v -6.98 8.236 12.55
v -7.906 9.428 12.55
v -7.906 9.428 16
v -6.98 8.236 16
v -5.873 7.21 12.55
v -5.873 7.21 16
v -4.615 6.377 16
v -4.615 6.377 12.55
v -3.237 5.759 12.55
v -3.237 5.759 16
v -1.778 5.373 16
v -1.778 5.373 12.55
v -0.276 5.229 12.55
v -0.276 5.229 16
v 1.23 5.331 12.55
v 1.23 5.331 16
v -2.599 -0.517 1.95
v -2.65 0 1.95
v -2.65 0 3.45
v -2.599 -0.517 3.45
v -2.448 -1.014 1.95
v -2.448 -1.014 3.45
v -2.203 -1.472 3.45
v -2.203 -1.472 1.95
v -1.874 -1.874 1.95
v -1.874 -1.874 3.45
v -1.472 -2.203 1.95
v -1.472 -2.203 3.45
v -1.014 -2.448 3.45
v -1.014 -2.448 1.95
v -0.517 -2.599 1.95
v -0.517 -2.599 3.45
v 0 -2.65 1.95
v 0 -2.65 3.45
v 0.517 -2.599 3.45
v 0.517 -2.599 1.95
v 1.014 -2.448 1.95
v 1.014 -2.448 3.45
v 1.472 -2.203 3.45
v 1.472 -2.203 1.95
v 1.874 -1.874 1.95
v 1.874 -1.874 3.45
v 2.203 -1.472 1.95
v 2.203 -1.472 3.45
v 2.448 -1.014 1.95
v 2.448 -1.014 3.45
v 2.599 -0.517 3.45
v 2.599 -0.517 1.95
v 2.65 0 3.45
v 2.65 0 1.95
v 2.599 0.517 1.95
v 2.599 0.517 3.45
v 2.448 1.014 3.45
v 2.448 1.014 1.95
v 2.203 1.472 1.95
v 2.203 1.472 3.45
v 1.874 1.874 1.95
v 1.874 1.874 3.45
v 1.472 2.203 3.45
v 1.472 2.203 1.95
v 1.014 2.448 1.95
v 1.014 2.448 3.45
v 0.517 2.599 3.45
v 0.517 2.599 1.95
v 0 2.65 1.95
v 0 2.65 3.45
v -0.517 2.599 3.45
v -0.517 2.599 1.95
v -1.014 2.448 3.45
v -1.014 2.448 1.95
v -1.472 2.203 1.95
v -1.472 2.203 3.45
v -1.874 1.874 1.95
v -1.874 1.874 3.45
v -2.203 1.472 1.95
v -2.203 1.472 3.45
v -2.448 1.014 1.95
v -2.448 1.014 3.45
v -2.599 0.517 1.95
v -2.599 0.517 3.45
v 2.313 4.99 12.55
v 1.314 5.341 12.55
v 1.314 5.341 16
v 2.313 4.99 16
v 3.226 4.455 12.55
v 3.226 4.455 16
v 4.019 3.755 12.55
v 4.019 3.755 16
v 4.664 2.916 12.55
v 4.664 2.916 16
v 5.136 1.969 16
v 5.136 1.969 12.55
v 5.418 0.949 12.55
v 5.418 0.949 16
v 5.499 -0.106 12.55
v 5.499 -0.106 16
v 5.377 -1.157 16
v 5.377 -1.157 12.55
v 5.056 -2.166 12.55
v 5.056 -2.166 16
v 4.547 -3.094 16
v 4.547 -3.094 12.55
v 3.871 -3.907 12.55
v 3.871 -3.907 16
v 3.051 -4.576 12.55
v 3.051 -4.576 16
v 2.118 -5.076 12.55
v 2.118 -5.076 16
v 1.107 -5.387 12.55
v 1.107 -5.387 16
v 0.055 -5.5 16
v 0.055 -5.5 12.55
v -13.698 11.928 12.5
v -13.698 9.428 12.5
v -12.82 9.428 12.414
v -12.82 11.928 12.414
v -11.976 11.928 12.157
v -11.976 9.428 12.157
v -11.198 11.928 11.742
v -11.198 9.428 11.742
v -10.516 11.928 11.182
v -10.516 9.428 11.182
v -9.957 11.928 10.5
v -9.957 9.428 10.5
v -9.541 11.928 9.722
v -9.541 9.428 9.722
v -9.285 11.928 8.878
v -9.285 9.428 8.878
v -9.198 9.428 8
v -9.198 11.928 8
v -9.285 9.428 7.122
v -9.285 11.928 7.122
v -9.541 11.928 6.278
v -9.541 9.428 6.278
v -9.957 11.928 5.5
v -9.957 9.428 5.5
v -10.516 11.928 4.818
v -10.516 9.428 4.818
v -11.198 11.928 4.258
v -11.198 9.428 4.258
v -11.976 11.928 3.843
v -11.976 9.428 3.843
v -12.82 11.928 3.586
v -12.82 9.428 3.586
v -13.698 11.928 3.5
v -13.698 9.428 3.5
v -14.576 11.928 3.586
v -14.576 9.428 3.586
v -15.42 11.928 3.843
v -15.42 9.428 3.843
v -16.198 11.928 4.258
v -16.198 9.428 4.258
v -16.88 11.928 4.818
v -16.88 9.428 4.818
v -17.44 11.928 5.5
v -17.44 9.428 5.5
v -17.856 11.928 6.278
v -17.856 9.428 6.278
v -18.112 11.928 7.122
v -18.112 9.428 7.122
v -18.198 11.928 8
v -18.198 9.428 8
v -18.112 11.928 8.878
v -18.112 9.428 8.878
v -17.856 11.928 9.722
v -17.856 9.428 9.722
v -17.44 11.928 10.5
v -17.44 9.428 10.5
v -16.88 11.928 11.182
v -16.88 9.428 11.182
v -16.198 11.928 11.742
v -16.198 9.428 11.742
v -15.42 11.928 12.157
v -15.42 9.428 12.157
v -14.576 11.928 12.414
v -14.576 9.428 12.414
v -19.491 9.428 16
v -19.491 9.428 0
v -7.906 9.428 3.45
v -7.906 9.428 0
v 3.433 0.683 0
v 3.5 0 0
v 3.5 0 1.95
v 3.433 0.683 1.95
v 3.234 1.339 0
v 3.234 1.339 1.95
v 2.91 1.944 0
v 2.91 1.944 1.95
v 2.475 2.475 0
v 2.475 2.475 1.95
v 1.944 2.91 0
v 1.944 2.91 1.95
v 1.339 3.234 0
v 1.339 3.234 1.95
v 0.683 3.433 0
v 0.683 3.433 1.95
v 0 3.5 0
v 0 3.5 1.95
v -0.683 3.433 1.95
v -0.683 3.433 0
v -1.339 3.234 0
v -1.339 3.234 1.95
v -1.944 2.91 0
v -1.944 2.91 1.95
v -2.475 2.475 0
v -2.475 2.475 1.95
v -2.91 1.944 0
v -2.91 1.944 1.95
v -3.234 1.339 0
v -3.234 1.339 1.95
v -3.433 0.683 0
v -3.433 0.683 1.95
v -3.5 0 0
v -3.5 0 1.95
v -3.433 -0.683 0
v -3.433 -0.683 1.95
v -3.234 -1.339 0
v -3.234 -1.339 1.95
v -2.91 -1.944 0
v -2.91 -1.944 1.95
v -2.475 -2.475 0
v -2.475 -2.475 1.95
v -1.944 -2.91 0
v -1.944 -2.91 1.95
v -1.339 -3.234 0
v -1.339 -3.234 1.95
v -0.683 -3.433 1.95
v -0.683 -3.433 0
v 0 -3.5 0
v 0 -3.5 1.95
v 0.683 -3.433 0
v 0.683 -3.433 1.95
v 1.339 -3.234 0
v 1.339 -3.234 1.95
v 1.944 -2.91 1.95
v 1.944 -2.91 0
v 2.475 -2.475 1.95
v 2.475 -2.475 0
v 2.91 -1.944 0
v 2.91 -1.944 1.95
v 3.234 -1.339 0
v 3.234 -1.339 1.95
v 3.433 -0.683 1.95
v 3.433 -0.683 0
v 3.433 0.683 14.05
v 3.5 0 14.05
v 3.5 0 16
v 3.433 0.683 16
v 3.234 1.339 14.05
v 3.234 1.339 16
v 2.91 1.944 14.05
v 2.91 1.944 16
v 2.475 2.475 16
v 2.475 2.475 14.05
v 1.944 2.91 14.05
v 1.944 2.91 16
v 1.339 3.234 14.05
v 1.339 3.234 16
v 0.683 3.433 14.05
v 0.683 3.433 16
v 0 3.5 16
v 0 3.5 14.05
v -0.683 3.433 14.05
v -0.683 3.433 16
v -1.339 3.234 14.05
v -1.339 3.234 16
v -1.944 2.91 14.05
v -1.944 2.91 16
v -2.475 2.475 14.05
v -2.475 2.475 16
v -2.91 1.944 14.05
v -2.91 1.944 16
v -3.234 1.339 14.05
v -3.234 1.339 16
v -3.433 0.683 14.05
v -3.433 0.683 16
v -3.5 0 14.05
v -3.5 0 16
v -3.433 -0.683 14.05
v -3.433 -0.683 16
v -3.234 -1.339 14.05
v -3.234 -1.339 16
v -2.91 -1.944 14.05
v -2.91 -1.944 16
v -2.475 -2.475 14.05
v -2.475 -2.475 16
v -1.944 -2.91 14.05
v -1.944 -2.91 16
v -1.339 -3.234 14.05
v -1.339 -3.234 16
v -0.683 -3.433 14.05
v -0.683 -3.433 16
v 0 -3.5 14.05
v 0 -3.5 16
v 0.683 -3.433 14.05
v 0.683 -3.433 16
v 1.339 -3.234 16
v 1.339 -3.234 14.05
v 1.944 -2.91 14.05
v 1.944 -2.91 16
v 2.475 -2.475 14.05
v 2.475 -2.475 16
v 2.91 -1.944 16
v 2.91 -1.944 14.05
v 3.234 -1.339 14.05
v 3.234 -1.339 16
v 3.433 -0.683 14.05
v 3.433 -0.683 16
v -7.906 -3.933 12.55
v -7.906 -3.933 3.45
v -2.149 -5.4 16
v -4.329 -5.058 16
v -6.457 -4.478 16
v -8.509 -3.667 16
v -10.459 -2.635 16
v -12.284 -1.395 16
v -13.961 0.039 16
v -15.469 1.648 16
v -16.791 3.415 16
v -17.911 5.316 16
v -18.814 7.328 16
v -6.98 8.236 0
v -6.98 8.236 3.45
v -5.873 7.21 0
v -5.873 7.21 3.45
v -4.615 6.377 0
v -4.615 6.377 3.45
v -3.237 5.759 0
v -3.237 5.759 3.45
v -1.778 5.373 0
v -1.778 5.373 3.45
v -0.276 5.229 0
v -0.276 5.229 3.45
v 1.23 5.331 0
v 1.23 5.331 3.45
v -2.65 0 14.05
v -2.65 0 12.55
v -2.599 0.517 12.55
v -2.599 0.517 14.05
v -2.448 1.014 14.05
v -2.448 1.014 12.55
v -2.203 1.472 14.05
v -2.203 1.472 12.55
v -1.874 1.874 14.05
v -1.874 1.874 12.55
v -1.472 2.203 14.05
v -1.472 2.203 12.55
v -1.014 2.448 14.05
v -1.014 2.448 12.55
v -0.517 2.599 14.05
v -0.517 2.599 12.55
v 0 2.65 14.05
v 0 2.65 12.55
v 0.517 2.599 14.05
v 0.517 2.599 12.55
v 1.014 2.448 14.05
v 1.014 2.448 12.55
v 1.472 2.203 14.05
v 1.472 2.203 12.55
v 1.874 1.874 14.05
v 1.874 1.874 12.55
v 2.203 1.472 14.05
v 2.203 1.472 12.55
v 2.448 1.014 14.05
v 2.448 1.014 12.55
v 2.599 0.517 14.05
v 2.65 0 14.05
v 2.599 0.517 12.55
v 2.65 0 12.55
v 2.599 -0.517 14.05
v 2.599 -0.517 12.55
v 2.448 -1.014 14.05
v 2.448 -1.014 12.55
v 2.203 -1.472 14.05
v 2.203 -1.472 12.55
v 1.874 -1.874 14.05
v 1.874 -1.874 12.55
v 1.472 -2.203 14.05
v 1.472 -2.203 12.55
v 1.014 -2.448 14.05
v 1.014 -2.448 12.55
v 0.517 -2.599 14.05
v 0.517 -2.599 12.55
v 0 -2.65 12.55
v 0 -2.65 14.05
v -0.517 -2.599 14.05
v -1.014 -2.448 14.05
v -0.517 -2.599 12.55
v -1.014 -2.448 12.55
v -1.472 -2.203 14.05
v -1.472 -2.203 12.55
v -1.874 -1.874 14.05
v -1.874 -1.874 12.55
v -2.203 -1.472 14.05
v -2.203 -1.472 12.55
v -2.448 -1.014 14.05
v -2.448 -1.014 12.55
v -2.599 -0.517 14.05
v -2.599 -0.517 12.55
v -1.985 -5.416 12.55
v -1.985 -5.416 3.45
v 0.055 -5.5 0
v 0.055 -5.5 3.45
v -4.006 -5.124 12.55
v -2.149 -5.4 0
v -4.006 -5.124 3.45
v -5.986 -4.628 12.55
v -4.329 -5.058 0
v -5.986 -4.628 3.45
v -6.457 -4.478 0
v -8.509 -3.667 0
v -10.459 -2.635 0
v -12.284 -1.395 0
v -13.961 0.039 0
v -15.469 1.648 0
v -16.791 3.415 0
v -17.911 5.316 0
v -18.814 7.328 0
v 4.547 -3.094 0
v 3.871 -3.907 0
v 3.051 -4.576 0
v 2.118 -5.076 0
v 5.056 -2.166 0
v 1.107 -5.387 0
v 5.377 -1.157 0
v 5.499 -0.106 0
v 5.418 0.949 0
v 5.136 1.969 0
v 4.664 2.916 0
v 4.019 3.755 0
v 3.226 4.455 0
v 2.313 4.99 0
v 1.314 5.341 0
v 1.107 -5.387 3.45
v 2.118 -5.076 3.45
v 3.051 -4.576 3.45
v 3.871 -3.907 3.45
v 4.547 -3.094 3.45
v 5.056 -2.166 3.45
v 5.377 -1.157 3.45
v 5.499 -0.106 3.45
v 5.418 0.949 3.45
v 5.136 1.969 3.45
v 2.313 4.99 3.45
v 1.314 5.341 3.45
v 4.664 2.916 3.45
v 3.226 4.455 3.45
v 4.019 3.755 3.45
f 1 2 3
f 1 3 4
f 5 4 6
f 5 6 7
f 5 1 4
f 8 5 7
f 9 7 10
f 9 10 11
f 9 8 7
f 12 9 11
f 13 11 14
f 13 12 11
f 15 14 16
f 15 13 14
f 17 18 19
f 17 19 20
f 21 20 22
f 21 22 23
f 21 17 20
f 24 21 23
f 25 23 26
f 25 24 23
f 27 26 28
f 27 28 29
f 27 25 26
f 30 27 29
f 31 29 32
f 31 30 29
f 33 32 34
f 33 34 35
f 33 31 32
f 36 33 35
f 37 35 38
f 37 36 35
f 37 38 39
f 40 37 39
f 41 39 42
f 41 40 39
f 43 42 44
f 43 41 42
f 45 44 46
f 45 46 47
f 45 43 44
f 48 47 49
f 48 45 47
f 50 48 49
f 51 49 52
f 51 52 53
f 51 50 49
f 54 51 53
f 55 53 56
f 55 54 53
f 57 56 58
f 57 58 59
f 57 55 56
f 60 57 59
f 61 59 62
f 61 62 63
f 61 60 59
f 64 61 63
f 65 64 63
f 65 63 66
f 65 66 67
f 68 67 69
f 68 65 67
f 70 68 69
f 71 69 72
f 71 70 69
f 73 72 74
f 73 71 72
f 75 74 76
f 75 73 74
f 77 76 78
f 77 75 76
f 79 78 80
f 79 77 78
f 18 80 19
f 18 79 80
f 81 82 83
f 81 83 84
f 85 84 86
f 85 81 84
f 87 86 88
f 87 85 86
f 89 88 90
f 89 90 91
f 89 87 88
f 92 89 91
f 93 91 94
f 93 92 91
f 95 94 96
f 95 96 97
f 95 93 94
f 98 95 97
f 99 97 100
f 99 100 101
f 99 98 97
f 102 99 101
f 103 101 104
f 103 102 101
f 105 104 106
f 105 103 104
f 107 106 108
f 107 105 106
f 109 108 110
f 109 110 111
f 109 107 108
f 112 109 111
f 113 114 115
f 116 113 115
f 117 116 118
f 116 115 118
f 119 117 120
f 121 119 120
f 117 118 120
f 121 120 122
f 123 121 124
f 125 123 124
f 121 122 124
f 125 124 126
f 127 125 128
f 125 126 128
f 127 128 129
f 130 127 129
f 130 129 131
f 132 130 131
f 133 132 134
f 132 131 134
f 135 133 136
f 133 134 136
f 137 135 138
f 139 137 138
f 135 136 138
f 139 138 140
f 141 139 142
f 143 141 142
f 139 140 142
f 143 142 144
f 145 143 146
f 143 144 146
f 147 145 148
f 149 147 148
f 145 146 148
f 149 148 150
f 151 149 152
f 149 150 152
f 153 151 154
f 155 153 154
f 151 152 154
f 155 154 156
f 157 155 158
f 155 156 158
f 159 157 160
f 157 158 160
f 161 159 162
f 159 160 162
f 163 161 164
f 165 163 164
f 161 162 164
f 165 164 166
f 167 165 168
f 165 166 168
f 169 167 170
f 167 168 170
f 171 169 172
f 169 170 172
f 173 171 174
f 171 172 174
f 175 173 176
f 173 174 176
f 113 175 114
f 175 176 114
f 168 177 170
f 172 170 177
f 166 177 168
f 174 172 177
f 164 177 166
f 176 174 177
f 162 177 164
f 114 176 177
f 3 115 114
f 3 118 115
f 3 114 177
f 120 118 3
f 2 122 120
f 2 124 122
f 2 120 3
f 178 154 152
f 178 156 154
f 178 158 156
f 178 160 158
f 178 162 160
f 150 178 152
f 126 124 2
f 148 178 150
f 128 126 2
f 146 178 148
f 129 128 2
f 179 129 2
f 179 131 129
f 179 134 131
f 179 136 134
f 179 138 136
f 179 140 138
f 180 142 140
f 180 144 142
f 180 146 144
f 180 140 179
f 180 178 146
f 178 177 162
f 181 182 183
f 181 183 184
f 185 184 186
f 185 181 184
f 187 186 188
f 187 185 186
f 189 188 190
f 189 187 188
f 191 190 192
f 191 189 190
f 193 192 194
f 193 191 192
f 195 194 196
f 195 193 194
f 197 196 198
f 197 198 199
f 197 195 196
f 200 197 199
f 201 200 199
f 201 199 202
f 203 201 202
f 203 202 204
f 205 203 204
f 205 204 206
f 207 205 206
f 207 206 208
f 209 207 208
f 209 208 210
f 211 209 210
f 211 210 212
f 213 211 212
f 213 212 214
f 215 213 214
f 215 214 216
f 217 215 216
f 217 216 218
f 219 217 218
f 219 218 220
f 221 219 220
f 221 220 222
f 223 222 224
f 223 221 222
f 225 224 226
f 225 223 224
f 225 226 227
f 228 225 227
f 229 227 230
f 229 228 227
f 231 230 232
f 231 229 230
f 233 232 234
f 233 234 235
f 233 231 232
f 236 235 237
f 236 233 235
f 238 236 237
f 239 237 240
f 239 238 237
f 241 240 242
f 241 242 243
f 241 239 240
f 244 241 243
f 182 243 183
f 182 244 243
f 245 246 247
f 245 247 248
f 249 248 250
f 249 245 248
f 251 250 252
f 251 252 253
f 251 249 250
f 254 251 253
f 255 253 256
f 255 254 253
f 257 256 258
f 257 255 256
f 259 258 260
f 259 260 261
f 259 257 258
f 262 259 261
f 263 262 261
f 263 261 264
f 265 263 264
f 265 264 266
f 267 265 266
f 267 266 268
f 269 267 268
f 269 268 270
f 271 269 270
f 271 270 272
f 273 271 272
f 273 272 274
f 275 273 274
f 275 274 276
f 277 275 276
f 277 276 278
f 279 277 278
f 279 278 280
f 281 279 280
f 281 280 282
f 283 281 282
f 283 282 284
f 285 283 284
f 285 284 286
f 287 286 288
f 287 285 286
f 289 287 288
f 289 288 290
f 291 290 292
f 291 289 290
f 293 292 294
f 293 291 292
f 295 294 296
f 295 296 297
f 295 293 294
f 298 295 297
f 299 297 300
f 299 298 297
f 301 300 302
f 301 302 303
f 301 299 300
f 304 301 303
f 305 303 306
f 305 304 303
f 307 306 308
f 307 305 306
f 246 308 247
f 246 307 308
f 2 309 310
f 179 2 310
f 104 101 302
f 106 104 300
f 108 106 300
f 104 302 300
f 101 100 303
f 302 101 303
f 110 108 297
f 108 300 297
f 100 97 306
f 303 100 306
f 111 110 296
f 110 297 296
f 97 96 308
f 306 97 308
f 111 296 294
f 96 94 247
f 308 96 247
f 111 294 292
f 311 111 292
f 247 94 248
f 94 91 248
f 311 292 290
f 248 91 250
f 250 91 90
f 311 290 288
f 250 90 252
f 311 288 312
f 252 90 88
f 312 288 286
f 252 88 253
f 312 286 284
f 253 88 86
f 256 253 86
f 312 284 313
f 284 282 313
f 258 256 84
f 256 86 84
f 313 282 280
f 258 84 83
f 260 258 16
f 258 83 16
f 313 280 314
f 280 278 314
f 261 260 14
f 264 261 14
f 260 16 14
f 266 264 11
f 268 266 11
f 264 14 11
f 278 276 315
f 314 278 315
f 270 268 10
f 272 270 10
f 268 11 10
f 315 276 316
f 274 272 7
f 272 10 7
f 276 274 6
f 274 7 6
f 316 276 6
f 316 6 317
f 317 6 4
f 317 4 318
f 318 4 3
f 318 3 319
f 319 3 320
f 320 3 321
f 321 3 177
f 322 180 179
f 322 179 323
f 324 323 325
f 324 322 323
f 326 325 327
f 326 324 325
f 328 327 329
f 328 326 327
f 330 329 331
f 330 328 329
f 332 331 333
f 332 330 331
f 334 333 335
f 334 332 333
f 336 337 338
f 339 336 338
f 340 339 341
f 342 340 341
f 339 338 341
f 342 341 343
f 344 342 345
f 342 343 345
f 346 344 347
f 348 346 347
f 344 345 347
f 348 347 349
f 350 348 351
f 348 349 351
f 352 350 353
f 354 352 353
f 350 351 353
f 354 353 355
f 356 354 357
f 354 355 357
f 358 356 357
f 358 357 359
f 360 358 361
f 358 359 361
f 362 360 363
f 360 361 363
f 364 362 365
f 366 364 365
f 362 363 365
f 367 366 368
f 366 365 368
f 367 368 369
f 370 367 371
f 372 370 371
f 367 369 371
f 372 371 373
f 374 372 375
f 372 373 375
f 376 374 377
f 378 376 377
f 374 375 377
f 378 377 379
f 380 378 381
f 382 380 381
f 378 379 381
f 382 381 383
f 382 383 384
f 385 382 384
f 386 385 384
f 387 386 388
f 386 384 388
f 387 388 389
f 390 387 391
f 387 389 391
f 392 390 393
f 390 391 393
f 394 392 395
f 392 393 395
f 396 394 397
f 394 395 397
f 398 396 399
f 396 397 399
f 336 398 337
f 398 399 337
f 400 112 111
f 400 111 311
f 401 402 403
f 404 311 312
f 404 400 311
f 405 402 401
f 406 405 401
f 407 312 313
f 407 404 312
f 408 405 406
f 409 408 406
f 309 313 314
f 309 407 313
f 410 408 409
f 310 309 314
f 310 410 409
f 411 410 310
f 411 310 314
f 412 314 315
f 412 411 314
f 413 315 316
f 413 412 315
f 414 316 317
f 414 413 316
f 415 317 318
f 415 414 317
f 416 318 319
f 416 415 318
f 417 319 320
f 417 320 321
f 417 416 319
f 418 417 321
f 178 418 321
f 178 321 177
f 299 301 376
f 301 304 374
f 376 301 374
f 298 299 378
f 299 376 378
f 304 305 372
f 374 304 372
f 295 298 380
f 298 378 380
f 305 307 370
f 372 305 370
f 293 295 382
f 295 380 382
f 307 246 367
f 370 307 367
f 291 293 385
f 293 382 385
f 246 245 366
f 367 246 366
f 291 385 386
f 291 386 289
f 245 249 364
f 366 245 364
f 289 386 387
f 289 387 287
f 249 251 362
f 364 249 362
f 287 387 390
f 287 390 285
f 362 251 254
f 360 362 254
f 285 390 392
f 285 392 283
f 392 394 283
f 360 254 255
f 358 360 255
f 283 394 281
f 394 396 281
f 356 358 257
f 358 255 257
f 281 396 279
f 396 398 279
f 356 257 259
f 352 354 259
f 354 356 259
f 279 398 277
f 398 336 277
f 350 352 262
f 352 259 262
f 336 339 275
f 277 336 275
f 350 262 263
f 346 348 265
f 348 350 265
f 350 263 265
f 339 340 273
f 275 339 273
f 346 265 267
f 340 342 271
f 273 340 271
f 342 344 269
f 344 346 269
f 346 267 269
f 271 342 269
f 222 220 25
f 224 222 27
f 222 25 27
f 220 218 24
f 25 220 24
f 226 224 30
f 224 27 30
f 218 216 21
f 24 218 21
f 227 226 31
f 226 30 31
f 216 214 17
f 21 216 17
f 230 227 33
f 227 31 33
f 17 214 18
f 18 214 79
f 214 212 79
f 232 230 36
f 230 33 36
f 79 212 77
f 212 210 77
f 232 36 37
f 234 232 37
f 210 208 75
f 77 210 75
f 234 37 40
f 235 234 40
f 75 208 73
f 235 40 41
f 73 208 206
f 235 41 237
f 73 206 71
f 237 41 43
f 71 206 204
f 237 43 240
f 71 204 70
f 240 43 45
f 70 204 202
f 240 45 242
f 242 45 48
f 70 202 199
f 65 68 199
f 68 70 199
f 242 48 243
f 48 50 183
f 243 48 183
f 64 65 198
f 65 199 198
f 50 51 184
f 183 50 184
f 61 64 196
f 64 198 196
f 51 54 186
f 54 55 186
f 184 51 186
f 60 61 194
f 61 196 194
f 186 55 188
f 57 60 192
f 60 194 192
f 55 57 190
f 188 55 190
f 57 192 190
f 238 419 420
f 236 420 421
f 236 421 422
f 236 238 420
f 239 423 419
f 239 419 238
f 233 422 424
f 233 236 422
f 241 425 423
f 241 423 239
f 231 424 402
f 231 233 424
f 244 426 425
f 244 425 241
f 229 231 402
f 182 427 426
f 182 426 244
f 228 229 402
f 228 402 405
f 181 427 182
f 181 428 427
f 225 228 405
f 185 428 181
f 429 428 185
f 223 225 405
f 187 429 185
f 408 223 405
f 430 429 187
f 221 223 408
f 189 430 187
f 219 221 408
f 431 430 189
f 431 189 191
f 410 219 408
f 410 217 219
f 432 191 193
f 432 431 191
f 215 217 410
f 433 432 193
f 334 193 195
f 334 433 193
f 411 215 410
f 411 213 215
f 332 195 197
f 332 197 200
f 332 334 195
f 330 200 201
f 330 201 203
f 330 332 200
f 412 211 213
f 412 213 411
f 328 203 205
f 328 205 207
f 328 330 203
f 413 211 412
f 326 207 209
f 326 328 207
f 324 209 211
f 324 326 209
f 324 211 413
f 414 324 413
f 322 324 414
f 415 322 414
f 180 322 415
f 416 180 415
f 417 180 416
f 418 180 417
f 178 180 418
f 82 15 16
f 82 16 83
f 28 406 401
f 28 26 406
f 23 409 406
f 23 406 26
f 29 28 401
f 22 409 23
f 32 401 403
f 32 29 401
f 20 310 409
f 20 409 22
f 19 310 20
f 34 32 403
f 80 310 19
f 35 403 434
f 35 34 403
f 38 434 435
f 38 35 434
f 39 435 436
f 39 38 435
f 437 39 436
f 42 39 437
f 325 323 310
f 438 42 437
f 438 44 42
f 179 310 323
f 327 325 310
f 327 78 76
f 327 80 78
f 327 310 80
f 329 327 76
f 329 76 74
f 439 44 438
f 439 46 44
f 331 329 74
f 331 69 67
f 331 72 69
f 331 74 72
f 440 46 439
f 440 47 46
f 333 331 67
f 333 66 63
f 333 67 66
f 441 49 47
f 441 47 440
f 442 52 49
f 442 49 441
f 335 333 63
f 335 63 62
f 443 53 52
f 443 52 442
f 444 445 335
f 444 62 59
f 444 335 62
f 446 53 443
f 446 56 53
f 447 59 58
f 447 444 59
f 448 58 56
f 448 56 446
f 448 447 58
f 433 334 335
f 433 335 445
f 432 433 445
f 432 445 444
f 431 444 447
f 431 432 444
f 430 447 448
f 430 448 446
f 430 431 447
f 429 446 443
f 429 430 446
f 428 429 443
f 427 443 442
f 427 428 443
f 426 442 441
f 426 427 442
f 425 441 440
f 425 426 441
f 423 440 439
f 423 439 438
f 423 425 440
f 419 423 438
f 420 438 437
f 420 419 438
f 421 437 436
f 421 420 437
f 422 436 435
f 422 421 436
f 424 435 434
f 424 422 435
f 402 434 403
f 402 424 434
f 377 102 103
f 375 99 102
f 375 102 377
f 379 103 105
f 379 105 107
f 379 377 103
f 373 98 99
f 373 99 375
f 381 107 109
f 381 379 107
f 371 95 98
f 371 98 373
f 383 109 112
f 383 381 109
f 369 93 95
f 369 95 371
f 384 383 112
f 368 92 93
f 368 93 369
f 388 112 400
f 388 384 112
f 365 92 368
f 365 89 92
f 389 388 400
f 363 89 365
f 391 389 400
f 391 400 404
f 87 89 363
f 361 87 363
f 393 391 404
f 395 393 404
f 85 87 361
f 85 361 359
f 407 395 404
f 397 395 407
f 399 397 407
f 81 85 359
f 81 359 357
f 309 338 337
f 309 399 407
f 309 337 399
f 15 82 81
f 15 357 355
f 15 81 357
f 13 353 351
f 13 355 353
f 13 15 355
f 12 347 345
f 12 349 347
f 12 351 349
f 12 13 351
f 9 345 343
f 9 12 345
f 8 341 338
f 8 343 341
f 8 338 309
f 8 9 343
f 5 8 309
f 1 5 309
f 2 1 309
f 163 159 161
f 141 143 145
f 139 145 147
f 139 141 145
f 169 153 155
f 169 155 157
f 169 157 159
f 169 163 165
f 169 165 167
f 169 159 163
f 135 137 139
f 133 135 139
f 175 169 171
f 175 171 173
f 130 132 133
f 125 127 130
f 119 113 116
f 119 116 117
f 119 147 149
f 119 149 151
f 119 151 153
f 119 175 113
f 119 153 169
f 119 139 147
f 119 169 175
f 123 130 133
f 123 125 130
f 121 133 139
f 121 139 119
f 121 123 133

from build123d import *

# Parameters (mm, degrees)
CROQUIS1_R              = 3.5
SALIENTE_EXTRUIR1_DEPTH = 16
CROQUIS2_W              = 18.232700604
CROQUIS2_H              = 9.1
CORTAR_EXTRUIR1_DEPTH   = 22
CROQUIS3_R              = 3.5
CROQUIS3_R_2            = 2.65
SALIENTE_EXTRUIR2_DEPTH = 1.5
SALIENTE_EXTRUIR3_START = -1.5
CROQUIS4_R              = 3.5
CROQUIS4_R_2            = 2.65
SALIENTE_EXTRUIR3_DEPTH = 1.5
CROQUIS5_R              = 4.5
SALIENTE_EXTRUIR4_DEPTH = 2.5


with BuildPart() as part:
    # Croquis1 → Saliente-Extruir1 (new body)
    with BuildSketch(Plane.XY):
        with BuildLine():
            Line((-19.490709772, 9.428309156), (-7.90572953, 9.428309156))
            ThreePointArc((-7.90572953, 9.428309156), (-3.938516352, 6.040037718), (1.230212675, 5.330528037))
            Line((1.230212675, 5.330528037), (1.314384466, 5.340636055))
            ThreePointArc((1.314384466, 5.340636055), (5.463239212, -0.634836445), (0.054718216, -5.499727804))
            ThreePointArc((0.054718216, -5.499727804), (-12.283781153, -1.395117758), (-19.490709772, 9.428309156))
        make_face()
        Circle(CROQUIS1_R, mode=Mode.SUBTRACT)
    extrude(amount=SALIENTE_EXTRUIR1_DEPTH)

    # Croquis2 → Cortar-Extruir1 (cut)
    with BuildSketch(Plane(origin=(0, 9.428309156, 0), x_dir=(1, 0, 0), z_dir=(0, 1, 0))):
        with Locations((1.210620772, -8)):
            Rectangle(CROQUIS2_W, CROQUIS2_H)
    extrude(amount=-CORTAR_EXTRUIR1_DEPTH, mode=Mode.SUBTRACT)

    # Croquis3 → Saliente-Extruir2 (add)
    with BuildSketch(Plane(origin=(0, 0, 12.55), x_dir=(-1, 0, 0), z_dir=(0, 0, -1))):
        Circle(CROQUIS3_R)
        Circle(CROQUIS3_R_2, mode=Mode.SUBTRACT)
    extrude(amount=-SALIENTE_EXTRUIR2_DEPTH)

    # Croquis4 → Saliente-Extruir3 (add)
    with BuildSketch(Plane.XY.offset(3.45).offset(SALIENTE_EXTRUIR3_START)):
        Circle(CROQUIS4_R)
        with Locations(Location((0, 0, 0), (0, 0, 180))):
            Circle(CROQUIS4_R_2, mode=Mode.SUBTRACT)
    extrude(amount=SALIENTE_EXTRUIR3_DEPTH)

    # Croquis5 → Saliente-Extruir4 (add)
    with BuildSketch(Plane(origin=(0, 9.428309156, 0), x_dir=(1, 0, 0), z_dir=(0, 1, 0))):
        with Locations(Location((-13.698219651, -8, 0), (0, 0, 270))):
            Circle(CROQUIS5_R)
    extrude(amount=SALIENTE_EXTRUIR4_DEPTH)


solid = part.part
